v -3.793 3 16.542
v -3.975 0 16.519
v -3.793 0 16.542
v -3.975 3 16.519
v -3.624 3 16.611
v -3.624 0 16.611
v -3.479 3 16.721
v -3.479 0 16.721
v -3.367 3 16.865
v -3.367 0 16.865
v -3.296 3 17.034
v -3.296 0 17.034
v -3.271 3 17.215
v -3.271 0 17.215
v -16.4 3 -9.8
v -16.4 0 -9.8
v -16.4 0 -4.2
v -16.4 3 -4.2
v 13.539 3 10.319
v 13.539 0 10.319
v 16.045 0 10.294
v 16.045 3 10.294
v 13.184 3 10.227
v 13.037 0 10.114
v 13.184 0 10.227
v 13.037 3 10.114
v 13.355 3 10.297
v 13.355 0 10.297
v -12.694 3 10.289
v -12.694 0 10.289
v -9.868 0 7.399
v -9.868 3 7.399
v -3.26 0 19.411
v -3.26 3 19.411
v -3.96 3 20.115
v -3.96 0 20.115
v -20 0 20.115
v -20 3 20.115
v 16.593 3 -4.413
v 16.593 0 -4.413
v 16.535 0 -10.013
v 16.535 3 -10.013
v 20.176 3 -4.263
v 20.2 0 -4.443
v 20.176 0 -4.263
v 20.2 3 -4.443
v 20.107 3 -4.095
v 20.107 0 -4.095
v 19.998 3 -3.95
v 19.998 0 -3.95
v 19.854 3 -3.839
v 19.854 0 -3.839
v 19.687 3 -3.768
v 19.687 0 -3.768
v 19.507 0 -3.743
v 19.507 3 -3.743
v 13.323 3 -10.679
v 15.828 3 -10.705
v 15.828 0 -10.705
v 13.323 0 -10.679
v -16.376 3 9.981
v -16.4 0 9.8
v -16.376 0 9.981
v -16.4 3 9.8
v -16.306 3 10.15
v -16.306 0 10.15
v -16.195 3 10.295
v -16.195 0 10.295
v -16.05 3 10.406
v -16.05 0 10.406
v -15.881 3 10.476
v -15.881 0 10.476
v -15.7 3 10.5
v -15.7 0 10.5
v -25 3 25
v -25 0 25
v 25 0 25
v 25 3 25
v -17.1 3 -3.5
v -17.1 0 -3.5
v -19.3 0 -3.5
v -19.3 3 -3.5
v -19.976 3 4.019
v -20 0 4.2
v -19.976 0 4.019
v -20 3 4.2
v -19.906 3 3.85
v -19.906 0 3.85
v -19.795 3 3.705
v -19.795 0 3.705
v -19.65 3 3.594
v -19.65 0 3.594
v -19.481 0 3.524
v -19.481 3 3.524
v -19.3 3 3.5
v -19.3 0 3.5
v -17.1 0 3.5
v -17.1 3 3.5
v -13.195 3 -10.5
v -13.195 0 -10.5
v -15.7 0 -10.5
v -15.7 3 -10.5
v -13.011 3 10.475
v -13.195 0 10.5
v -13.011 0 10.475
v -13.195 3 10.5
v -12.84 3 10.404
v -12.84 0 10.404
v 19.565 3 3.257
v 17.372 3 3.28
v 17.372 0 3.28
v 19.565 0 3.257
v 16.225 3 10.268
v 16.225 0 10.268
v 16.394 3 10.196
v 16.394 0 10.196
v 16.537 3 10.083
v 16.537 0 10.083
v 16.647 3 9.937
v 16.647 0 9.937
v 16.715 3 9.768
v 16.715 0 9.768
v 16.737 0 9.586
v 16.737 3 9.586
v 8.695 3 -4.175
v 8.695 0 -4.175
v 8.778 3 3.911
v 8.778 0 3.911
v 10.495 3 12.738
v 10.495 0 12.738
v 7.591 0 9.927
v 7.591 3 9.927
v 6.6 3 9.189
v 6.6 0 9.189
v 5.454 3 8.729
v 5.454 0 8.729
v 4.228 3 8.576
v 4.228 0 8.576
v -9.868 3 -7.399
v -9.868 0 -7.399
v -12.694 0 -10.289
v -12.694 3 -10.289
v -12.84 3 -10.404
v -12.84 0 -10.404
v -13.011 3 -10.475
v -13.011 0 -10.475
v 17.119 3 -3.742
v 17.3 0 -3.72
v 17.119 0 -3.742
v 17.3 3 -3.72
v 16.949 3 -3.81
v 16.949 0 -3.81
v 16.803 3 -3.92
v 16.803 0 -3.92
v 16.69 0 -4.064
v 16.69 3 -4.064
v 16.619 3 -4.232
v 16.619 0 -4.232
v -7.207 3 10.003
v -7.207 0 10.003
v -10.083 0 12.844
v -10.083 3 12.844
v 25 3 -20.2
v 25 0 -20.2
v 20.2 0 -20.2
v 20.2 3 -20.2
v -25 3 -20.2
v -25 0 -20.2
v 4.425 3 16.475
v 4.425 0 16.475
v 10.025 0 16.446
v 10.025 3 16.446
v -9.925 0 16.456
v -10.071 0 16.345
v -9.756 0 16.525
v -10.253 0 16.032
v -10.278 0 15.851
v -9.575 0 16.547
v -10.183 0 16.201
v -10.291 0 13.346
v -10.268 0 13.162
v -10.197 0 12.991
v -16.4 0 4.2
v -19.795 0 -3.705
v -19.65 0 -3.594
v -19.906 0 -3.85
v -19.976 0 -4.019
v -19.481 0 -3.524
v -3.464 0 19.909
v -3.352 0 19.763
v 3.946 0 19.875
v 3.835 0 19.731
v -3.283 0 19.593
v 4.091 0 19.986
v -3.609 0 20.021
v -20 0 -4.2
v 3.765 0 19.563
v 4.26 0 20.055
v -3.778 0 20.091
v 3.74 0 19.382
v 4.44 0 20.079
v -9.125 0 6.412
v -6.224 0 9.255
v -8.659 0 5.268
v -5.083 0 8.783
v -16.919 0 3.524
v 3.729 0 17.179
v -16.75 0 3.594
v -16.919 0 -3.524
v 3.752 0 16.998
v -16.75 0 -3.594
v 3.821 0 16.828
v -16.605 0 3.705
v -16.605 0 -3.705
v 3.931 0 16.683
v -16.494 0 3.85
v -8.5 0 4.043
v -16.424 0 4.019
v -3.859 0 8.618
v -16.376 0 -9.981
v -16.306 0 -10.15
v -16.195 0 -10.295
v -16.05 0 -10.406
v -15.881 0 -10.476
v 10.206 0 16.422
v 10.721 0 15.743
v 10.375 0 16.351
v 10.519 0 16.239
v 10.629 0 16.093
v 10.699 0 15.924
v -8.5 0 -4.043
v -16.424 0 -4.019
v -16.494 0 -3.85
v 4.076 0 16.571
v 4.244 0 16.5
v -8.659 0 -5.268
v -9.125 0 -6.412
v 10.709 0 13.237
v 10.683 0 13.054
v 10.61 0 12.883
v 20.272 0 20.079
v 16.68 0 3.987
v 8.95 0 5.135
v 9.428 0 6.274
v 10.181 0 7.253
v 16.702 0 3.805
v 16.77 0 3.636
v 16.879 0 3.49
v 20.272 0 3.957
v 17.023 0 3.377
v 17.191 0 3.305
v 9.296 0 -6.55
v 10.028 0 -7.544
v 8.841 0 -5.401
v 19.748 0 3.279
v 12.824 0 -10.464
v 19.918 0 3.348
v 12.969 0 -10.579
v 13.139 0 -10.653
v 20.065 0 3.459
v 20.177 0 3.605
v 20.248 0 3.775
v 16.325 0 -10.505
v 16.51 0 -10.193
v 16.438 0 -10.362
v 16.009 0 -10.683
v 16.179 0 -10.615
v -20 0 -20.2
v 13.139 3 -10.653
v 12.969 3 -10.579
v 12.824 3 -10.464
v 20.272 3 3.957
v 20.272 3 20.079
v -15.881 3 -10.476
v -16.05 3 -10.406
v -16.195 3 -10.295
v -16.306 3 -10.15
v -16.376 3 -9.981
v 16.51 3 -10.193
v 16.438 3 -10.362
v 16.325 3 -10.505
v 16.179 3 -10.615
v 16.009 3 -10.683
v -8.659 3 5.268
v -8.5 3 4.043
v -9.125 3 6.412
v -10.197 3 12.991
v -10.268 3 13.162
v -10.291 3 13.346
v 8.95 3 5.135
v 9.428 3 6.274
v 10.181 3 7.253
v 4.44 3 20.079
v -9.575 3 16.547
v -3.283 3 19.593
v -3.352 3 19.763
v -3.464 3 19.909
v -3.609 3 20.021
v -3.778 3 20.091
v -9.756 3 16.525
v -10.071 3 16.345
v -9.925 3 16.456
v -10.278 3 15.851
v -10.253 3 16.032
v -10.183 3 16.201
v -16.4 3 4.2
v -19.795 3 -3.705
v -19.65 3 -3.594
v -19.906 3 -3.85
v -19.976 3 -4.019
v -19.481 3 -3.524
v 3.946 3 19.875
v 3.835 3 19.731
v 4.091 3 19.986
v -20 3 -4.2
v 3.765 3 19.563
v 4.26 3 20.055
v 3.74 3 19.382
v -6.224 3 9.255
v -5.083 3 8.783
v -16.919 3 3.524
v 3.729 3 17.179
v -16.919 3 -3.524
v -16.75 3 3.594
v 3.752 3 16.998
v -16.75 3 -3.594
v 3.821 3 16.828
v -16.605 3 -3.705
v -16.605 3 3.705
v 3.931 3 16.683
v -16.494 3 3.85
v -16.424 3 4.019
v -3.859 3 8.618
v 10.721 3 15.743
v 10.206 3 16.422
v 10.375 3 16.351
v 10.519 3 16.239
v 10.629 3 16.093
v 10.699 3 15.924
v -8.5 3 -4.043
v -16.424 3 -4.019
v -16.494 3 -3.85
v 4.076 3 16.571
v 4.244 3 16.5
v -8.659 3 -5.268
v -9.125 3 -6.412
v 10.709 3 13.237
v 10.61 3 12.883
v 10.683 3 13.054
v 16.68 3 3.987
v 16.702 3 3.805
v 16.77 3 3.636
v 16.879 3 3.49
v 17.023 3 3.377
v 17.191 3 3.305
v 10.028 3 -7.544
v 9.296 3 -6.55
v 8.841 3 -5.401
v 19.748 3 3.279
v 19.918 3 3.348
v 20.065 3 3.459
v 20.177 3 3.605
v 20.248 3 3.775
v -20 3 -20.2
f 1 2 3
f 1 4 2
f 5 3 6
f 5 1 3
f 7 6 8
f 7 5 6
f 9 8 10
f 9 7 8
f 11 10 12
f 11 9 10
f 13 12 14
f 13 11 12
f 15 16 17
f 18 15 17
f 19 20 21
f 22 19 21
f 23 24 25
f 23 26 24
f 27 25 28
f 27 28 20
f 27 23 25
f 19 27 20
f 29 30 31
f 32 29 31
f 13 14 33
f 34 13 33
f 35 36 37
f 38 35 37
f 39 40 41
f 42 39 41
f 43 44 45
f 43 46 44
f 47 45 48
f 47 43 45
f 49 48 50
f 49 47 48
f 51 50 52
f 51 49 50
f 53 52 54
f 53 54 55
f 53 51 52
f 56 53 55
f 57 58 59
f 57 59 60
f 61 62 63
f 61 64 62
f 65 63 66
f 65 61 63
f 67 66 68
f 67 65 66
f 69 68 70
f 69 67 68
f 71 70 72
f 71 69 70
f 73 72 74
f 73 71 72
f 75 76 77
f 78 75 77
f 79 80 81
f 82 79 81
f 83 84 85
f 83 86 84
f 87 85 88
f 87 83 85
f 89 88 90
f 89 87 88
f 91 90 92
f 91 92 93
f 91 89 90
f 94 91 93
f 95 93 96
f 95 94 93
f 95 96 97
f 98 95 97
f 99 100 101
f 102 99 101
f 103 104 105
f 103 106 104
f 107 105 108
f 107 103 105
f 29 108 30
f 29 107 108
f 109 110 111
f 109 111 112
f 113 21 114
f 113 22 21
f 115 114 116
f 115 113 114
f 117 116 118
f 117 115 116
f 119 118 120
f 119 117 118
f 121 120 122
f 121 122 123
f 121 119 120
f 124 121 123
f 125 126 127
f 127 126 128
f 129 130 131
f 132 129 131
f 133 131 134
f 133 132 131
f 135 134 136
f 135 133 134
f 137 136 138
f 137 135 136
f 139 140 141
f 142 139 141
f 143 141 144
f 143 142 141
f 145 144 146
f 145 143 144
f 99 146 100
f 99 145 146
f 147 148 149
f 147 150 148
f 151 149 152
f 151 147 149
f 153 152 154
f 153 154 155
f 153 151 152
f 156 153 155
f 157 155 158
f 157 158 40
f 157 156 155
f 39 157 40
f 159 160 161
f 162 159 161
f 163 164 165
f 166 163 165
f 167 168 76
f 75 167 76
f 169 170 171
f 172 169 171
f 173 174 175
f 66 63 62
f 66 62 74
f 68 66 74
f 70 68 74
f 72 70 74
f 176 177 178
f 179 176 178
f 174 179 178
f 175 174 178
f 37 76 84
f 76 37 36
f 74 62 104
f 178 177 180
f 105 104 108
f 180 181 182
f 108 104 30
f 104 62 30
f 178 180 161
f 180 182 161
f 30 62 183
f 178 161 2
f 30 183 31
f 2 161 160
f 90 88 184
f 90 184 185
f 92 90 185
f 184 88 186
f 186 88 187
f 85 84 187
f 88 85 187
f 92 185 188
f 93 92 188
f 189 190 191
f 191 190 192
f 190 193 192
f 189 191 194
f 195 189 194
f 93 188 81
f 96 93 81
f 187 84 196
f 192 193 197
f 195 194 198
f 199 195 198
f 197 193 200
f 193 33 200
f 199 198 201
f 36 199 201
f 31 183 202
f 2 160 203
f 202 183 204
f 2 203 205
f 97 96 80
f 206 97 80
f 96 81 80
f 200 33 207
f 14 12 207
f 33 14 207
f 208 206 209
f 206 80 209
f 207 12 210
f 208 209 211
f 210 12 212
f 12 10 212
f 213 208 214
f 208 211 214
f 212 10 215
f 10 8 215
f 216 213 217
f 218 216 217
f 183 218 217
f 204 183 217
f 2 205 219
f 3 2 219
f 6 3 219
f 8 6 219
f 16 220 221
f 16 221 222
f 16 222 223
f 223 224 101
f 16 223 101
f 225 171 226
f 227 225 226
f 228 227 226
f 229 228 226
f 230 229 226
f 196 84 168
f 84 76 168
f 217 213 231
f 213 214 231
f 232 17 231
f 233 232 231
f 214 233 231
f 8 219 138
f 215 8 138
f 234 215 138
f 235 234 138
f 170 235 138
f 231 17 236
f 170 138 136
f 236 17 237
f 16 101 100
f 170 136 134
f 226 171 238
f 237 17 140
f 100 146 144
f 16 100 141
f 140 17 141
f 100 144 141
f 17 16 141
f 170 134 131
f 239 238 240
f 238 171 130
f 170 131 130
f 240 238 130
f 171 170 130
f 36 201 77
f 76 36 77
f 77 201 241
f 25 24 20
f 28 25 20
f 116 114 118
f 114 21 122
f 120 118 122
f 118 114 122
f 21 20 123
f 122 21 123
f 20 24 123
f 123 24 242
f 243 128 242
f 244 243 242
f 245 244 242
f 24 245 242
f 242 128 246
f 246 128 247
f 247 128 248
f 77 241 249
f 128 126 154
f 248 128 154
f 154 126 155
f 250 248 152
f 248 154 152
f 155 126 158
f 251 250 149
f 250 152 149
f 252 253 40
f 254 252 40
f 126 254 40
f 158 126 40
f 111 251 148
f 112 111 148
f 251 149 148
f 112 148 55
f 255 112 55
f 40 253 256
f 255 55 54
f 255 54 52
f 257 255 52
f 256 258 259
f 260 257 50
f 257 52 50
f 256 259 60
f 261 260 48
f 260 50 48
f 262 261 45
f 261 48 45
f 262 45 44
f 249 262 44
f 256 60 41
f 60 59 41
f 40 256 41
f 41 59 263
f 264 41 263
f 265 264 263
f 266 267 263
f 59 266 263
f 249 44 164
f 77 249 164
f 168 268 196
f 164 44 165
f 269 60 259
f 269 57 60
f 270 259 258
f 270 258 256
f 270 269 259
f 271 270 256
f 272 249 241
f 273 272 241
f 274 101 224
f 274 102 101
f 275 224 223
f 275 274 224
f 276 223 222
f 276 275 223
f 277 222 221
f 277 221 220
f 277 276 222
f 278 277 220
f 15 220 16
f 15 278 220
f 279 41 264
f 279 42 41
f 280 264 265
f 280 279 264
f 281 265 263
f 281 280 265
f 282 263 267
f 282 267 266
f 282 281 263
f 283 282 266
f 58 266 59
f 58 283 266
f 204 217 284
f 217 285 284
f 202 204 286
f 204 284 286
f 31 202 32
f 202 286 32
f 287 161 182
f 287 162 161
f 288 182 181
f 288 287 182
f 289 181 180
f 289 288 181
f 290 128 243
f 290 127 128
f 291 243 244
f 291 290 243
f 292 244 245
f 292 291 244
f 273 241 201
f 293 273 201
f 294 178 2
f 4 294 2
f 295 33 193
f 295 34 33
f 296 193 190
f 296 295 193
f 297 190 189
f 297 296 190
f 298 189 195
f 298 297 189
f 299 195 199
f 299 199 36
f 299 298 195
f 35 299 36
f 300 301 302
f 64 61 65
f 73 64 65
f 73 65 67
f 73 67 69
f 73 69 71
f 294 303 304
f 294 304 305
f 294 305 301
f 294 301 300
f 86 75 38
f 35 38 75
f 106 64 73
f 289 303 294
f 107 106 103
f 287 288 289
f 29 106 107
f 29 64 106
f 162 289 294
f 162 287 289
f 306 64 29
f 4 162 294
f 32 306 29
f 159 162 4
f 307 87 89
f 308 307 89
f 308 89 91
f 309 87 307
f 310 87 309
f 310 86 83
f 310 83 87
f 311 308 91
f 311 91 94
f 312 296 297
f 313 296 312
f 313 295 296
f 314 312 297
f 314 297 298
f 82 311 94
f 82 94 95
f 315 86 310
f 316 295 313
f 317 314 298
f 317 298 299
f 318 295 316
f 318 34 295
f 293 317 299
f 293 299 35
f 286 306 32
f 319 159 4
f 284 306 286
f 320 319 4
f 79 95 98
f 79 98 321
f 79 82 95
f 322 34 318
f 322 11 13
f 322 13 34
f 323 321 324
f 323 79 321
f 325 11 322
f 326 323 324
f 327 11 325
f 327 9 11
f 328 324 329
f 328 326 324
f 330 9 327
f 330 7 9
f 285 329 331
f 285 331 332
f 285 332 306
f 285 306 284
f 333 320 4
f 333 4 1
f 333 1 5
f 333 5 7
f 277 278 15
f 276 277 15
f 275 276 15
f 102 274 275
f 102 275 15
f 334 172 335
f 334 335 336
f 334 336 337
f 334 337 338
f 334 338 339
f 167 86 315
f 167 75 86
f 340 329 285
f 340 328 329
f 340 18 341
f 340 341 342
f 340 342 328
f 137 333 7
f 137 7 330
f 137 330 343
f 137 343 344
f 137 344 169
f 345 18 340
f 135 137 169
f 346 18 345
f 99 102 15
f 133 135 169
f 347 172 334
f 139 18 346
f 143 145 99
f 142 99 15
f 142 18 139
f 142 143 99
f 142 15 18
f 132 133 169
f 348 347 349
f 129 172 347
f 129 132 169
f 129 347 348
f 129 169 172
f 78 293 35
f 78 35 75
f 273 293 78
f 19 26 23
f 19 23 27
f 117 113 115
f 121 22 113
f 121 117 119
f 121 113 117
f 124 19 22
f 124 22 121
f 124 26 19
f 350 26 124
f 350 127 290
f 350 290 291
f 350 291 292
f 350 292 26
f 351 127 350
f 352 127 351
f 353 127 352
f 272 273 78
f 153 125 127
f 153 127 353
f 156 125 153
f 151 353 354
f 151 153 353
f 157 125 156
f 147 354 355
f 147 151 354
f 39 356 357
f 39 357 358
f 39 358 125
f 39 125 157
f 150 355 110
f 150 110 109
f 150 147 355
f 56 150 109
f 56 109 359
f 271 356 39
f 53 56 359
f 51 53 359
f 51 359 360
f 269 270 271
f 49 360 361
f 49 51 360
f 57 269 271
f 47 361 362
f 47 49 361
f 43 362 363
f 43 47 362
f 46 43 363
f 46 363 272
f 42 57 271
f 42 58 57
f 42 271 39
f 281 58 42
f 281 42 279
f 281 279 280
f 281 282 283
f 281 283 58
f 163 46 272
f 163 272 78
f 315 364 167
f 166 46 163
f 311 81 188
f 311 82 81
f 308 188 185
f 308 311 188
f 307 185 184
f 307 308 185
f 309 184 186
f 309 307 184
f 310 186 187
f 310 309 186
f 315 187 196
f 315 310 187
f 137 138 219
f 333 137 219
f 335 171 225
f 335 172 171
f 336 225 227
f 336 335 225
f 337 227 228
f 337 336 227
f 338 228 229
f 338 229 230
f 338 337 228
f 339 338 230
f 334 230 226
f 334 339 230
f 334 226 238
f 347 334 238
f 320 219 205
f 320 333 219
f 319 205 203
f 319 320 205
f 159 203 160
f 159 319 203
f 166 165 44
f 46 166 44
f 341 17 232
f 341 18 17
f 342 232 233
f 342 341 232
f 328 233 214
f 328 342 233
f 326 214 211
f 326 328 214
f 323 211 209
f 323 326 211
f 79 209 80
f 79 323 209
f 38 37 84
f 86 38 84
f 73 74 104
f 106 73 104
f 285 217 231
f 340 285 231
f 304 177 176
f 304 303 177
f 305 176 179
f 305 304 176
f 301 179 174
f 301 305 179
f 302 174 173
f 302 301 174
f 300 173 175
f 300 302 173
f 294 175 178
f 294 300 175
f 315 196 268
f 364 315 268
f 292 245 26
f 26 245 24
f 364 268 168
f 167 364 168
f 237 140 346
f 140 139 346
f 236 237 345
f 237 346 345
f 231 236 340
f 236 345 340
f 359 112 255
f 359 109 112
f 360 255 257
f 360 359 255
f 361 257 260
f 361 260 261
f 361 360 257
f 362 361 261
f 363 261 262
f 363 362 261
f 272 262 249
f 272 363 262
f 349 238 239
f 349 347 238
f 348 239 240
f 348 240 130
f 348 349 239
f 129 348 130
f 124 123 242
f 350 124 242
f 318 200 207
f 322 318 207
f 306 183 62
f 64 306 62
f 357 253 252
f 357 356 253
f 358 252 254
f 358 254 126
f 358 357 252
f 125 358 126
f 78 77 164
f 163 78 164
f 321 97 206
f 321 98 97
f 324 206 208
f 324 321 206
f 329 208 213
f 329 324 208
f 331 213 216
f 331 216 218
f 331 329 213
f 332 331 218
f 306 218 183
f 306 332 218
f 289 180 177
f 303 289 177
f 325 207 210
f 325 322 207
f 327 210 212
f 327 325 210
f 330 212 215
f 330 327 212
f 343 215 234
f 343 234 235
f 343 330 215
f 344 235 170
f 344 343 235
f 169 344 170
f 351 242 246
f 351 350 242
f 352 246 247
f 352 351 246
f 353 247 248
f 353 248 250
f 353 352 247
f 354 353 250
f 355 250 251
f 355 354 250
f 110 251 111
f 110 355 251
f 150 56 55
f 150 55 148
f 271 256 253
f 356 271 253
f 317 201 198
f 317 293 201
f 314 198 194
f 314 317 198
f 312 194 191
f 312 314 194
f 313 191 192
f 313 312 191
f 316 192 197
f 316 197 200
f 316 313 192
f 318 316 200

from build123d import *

# Parameters (mm, degrees)
BOSS_EXTRUDE1_DEPTH = 3
FILLET4_R           = 0.7
FILLET5_R           = 4.8


with BuildPart() as part:
    # Sketch1 → Boss-Extrude1 (new body)
    with BuildSketch(Plane(origin=(0, 0, 0), x_dir=(1, 0, 0), z_dir=(0, 1, 0))):
        Polygon((-25, -25), (25, -25), (25, 20.2), (20.2, 20.2), (20.2, 3.75), (16.600191324, 3.712885357), (16.528023963, 10.712513338), (13.028209972, 10.676429657), (8.674837116, 6.131306471), (8.798552593, -5.868055782), (13.244712056, -10.322454286), (16.744526047, -10.286370605), (16.672358686, -3.286742624), (20.272167361, -3.249627981), (20.272167361, -20.078881527), (3.743734852, -20.078881527), (3.725177284, -16.478929358), (10.725084279, -16.442845198), (10.707042199, -12.942891701), (6.184420516, -8.566147121), (-5.815420046, -8.628005682), (-10.292678785, -13.051144181), (-10.274636705, -16.551097679), (-3.27472971, -16.515013518), (-3.256172142, -20.114965687), (-20, -20.114965687), (-20, -3.5), (-16.4, -3.5), (-16.4, -10.5), (-12.9, -10.5), (-8.5, -6), (-8.5, 6), (-12.9, 10.5), (-16.4, 10.5), (-16.4, 3.5), (-20, 3.5), (-20, 20.2), (-25, 20.2), align=None)
    extrude(amount=BOSS_EXTRUDE1_DEPTH)

    # Fillet4
    fillet4_edges = [part.edges().sort_by_distance(p)[0] for p in [
        (-3.27472971, 1.5, 16.515013518),
        (-10.274636705, 1.5, 16.551097679),
        (-10.292678785, 1.5, 13.051144181),
        (10.707042199, 1.5, 12.942891701),
        (10.725084279, 1.5, 16.442845198),
        (3.725177284, 1.5, 16.478929358),
        (3.743734852, 1.5, 20.078881527),
        (20.272167361, 1.5, 3.249627981),
        (16.672358686, 1.5, 3.286742624),
        (16.744526047, 1.5, 10.286370605),
        (13.244712056, 1.5, 10.322454286),
        (13.028209972, 1.5, -10.676429657),
        (16.528023963, 1.5, -10.712513338),
        (16.600191324, 1.5, -3.712885357),
        (20.2, 1.5, -3.75),
        (-20, 1.5, -3.5),
        (-16.4, 1.5, -3.5),
        (-16.4, 1.5, -10.5),
        (-12.9, 1.5, -10.5),
        (-12.9, 1.5, 10.5),
        (-16.4, 1.5, 10.5),
        (-16.4, 1.5, 3.5),
        (-20, 1.5, 3.5),
        (-3.256172142, 1.5, 20.114965687),
    ]]
    fillet(fillet4_edges, radius=FILLET4_R)

    # Fillet5
    fillet5_edges = [part.edges().sort_by_distance(p)[0] for p in [
        (-5.815420046, 1.5, 8.628005682),
        (6.184420516, 1.5, 8.566147121),
        (8.798552593, 1.5, 5.868055782),
        (8.674837116, 1.5, -6.131306471),
        (-8.5, 1.5, -6),
        (-8.5, 1.5, 6),
    ]]
    fillet(fillet5_edges, radius=FILLET5_R)


solid = part.part
